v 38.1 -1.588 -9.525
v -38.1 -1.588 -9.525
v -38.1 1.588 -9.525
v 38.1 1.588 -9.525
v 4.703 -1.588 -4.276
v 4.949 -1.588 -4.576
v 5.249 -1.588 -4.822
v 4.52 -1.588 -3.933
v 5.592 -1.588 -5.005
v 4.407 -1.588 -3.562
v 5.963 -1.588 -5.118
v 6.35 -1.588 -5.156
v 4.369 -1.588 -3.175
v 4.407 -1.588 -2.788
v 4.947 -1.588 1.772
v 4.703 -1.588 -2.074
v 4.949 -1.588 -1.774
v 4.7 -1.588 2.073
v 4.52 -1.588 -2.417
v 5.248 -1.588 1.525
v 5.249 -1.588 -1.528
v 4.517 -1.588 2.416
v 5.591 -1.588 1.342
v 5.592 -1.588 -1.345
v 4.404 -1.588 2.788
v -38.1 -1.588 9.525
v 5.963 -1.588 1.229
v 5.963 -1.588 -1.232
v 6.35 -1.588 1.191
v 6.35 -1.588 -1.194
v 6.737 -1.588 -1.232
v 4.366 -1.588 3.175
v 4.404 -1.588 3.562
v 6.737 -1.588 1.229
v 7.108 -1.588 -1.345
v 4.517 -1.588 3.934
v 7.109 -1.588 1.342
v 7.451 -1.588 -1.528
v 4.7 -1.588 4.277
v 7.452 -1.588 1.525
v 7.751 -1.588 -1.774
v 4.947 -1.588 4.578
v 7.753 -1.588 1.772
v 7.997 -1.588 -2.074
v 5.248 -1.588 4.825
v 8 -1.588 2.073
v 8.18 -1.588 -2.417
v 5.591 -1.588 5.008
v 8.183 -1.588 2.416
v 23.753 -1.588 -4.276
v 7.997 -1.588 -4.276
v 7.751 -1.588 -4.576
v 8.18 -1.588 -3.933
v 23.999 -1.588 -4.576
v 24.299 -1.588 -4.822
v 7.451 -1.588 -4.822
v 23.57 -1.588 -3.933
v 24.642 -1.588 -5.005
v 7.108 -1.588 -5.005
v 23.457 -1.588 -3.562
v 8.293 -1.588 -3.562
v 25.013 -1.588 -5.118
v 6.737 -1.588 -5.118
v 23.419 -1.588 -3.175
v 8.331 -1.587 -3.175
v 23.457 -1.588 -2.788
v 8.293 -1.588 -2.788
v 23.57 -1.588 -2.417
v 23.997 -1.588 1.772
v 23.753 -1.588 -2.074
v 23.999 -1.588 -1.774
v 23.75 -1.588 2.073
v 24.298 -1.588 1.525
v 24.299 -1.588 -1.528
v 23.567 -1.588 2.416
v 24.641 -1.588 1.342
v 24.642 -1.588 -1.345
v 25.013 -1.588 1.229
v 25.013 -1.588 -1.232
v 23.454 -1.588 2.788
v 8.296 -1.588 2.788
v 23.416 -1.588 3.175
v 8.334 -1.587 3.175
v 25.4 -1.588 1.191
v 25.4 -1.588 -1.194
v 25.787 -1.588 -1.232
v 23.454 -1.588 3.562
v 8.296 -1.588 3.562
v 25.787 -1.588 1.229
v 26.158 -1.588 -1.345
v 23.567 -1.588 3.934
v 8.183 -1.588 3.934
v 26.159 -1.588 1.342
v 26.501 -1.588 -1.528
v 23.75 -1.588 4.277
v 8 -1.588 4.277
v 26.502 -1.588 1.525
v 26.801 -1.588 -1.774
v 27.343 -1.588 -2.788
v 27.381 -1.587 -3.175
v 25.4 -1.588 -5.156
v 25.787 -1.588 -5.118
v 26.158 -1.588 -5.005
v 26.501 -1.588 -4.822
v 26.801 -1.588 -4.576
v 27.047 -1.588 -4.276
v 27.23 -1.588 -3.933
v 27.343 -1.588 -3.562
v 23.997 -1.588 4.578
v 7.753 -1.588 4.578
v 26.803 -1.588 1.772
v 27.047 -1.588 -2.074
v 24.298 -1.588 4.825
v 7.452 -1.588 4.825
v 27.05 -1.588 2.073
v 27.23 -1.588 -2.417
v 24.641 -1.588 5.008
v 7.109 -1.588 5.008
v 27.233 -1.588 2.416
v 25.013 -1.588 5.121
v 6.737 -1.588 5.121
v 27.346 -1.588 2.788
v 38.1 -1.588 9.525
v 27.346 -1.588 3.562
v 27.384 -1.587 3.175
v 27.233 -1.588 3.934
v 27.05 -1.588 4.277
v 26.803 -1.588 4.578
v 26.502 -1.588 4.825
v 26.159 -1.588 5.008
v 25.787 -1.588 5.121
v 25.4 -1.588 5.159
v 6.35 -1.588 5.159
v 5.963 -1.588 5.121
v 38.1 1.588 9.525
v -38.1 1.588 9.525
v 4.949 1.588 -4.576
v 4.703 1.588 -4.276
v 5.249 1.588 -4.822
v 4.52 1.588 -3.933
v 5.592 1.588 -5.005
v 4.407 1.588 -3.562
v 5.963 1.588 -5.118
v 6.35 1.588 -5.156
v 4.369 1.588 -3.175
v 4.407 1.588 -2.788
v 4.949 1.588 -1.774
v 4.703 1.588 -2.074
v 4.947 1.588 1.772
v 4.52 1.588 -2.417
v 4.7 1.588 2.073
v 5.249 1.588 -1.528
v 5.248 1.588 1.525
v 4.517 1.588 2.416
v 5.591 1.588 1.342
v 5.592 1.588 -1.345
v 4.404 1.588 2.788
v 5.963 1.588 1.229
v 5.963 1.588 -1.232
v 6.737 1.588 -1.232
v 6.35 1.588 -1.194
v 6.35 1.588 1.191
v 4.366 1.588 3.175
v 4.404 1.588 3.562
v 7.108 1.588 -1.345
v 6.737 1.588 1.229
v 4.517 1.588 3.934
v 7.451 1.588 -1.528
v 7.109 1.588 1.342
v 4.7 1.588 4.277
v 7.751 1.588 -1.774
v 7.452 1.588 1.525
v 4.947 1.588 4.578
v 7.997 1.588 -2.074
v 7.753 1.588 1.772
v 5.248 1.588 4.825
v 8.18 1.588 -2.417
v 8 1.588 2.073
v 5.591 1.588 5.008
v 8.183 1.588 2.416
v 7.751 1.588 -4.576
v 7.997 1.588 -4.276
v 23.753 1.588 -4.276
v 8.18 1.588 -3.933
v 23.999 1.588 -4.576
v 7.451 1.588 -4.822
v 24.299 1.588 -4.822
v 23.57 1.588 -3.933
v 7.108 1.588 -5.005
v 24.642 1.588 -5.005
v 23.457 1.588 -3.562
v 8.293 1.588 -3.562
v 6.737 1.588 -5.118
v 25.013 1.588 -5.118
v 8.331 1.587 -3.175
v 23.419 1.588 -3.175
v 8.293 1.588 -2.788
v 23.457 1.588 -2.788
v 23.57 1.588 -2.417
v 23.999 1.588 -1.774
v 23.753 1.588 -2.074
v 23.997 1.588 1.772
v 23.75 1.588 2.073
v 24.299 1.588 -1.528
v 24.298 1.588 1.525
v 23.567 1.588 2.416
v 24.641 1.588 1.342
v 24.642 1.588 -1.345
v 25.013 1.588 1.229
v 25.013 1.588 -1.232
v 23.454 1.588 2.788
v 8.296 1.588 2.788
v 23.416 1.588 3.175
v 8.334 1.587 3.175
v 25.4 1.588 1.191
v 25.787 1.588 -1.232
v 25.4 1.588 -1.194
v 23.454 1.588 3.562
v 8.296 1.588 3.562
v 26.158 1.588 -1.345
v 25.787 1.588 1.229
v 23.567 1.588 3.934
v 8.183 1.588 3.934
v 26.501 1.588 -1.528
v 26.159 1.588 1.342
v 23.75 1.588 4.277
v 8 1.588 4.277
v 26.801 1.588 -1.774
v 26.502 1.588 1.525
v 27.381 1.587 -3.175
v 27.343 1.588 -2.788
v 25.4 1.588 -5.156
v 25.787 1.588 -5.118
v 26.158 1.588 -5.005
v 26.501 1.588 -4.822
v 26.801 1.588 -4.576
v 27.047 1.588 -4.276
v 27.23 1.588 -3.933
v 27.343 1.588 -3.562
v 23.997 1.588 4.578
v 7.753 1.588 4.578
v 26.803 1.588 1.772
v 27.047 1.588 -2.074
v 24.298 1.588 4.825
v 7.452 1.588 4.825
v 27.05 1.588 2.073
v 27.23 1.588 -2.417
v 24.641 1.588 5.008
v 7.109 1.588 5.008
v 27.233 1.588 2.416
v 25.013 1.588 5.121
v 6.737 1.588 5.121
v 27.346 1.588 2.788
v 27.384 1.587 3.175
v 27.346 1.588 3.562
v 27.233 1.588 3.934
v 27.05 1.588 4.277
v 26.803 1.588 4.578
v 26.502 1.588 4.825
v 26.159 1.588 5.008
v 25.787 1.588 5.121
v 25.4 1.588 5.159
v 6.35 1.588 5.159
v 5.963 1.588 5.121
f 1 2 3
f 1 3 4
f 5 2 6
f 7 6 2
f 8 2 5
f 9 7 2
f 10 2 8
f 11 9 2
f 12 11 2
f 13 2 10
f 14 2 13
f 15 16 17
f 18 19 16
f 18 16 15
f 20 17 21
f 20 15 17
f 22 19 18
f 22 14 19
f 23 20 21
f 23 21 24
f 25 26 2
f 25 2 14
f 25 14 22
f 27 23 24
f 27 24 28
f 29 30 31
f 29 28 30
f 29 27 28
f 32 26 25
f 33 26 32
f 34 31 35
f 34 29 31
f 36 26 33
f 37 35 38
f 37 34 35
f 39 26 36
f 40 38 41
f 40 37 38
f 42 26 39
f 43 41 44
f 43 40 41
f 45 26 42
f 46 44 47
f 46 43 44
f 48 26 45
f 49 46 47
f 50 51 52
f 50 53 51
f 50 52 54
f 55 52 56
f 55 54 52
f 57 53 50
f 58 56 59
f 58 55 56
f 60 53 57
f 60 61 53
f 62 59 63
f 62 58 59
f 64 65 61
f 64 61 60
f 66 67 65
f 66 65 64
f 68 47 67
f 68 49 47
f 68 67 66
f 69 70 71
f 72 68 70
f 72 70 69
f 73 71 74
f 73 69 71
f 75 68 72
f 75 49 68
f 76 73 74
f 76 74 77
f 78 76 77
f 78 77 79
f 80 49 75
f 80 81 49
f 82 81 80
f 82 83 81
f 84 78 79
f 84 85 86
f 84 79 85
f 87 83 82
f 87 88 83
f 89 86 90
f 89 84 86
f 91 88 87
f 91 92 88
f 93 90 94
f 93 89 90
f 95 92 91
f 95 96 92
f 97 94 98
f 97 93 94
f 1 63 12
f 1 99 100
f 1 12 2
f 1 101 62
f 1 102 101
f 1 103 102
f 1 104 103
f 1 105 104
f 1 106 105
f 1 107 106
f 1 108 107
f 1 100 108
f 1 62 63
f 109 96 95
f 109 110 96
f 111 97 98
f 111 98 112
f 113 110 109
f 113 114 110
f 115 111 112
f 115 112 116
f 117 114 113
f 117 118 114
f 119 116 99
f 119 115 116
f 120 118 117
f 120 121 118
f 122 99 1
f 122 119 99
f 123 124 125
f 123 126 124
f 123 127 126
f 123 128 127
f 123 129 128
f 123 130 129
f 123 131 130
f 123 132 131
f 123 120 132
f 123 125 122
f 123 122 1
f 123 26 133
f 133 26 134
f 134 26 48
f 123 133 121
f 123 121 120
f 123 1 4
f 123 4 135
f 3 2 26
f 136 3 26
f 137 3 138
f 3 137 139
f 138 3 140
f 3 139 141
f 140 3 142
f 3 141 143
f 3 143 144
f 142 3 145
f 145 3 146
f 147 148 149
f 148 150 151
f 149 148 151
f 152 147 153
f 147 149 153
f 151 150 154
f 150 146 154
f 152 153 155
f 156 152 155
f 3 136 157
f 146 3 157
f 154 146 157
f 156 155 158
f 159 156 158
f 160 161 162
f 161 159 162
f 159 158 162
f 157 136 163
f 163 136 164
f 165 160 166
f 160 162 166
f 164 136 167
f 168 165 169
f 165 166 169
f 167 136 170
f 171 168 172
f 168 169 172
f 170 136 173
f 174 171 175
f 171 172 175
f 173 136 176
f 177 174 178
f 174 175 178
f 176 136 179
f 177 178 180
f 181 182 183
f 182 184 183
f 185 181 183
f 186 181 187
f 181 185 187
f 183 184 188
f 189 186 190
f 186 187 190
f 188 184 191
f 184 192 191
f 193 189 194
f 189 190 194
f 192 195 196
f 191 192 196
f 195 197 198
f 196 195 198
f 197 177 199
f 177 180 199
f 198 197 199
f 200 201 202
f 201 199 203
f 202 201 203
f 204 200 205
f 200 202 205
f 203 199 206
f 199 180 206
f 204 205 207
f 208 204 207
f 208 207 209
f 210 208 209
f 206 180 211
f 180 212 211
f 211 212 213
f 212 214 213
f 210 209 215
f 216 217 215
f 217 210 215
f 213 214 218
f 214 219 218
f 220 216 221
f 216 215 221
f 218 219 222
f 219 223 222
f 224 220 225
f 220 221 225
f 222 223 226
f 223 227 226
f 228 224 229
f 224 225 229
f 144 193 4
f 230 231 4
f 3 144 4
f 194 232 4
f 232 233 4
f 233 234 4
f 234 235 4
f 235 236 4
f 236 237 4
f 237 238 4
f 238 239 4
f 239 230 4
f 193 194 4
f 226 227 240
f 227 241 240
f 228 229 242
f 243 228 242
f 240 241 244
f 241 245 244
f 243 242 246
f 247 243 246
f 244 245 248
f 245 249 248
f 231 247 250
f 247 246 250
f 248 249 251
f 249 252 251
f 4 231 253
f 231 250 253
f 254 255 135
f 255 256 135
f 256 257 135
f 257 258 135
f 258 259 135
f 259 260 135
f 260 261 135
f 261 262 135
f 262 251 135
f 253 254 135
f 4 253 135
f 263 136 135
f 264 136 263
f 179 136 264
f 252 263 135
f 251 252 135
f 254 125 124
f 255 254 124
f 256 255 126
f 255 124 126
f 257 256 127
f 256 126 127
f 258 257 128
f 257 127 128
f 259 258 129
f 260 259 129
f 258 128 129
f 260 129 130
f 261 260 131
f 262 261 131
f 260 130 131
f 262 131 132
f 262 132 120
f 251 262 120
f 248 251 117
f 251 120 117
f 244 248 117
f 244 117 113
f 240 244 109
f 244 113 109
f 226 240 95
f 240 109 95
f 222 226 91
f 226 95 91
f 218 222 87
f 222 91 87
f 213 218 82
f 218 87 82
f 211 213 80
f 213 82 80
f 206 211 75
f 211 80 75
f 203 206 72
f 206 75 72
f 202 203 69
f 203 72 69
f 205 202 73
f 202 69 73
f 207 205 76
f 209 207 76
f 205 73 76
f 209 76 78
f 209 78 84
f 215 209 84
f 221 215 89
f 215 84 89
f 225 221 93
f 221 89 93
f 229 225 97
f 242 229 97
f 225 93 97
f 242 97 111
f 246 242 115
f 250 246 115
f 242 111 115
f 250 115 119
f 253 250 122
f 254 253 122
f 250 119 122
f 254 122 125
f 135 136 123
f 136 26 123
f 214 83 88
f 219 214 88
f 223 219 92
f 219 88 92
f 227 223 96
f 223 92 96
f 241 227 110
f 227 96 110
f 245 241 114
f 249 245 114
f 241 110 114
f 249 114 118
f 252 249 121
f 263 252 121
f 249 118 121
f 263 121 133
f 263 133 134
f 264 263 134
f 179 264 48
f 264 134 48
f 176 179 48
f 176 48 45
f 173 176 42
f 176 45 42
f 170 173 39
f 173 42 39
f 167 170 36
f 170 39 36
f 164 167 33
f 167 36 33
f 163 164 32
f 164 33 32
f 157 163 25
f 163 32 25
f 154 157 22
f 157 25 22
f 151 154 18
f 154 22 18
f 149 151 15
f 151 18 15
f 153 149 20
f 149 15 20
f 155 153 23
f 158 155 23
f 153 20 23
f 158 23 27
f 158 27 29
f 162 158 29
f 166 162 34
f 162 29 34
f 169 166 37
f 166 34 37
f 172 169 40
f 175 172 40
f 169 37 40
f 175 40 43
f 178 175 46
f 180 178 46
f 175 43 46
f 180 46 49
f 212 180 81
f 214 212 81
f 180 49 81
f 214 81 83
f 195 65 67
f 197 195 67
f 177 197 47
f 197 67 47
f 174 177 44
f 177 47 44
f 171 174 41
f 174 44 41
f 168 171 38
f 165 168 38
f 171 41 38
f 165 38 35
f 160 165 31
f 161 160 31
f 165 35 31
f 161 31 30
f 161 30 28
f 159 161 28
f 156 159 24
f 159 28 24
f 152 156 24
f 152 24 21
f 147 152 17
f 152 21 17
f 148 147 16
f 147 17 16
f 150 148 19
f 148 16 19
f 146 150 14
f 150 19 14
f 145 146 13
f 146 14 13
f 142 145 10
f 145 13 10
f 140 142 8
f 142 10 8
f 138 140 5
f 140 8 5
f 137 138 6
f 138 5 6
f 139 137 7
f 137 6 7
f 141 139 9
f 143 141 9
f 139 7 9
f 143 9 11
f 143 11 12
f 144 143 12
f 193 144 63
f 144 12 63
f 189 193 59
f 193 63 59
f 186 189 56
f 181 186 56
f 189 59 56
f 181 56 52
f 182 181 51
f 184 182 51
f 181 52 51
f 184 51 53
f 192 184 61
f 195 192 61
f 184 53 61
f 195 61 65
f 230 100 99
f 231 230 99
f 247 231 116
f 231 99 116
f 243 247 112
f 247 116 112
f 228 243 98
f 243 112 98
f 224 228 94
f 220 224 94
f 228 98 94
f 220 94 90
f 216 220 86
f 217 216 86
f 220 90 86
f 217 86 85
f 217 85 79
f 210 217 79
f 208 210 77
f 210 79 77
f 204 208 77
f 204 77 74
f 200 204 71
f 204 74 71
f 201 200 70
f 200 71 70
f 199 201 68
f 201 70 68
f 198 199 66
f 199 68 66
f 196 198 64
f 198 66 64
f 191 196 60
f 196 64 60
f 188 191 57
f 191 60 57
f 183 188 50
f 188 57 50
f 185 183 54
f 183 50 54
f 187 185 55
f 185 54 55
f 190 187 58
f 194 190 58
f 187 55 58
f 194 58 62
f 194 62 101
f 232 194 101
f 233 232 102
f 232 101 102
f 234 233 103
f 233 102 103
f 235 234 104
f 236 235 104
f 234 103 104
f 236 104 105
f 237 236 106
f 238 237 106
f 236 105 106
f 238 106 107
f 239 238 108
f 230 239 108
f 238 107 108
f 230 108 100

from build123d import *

# Parameters (mm, degrees)
F0_W     = 76.2
F0_H     = 19.05
F1_DEPTH = 1.5875
F2_R     = 1.984375
F2_R_2   = 1.9812
F3_DEPTH = 3.175
F4_DEPTH = 3.175


# Not quite as in the source:
# - a length typed as a fraction of an inch, garbled in the dataset ("3 / 203.2 mm" for 3/8 in), is restored


with BuildPart() as f1:
    # F0 (on Front) → F1 (new body, symmetric)
    with BuildSketch(Plane.XZ):
        Rectangle(F0_W, F0_H)
    extrude(amount=F1_DEPTH, both=True)

    # F2 (on face) → F3 (cut)
    with BuildSketch(Plane.XZ.offset(1.5875)):
        with Locations((6.35, 3.175)):
            Circle(F2_R)
        with Locations((6.35, -3.175)):
            Circle(F2_R_2)
        with Locations((25.4, 3.175)):
            Circle(F2_R)
        with Locations((25.4, -3.175)):
            Circle(F2_R_2)
    extrude(amount=-F3_DEPTH, mode=Mode.SUBTRACT)

    # F2 (on face) → F4 (cut)
    with BuildSketch(Plane.XZ.offset(1.5875)):
        with Locations((6.35, 3.175)):
            Circle(F2_R)
        with Locations((6.35, -3.175)):
            Circle(F2_R_2)
        with Locations((25.4, 3.175)):
            Circle(F2_R)
        with Locations((25.4, -3.175)):
            Circle(F2_R_2)
    extrude(amount=-F4_DEPTH, mode=Mode.SUBTRACT)


solid = f1.part
